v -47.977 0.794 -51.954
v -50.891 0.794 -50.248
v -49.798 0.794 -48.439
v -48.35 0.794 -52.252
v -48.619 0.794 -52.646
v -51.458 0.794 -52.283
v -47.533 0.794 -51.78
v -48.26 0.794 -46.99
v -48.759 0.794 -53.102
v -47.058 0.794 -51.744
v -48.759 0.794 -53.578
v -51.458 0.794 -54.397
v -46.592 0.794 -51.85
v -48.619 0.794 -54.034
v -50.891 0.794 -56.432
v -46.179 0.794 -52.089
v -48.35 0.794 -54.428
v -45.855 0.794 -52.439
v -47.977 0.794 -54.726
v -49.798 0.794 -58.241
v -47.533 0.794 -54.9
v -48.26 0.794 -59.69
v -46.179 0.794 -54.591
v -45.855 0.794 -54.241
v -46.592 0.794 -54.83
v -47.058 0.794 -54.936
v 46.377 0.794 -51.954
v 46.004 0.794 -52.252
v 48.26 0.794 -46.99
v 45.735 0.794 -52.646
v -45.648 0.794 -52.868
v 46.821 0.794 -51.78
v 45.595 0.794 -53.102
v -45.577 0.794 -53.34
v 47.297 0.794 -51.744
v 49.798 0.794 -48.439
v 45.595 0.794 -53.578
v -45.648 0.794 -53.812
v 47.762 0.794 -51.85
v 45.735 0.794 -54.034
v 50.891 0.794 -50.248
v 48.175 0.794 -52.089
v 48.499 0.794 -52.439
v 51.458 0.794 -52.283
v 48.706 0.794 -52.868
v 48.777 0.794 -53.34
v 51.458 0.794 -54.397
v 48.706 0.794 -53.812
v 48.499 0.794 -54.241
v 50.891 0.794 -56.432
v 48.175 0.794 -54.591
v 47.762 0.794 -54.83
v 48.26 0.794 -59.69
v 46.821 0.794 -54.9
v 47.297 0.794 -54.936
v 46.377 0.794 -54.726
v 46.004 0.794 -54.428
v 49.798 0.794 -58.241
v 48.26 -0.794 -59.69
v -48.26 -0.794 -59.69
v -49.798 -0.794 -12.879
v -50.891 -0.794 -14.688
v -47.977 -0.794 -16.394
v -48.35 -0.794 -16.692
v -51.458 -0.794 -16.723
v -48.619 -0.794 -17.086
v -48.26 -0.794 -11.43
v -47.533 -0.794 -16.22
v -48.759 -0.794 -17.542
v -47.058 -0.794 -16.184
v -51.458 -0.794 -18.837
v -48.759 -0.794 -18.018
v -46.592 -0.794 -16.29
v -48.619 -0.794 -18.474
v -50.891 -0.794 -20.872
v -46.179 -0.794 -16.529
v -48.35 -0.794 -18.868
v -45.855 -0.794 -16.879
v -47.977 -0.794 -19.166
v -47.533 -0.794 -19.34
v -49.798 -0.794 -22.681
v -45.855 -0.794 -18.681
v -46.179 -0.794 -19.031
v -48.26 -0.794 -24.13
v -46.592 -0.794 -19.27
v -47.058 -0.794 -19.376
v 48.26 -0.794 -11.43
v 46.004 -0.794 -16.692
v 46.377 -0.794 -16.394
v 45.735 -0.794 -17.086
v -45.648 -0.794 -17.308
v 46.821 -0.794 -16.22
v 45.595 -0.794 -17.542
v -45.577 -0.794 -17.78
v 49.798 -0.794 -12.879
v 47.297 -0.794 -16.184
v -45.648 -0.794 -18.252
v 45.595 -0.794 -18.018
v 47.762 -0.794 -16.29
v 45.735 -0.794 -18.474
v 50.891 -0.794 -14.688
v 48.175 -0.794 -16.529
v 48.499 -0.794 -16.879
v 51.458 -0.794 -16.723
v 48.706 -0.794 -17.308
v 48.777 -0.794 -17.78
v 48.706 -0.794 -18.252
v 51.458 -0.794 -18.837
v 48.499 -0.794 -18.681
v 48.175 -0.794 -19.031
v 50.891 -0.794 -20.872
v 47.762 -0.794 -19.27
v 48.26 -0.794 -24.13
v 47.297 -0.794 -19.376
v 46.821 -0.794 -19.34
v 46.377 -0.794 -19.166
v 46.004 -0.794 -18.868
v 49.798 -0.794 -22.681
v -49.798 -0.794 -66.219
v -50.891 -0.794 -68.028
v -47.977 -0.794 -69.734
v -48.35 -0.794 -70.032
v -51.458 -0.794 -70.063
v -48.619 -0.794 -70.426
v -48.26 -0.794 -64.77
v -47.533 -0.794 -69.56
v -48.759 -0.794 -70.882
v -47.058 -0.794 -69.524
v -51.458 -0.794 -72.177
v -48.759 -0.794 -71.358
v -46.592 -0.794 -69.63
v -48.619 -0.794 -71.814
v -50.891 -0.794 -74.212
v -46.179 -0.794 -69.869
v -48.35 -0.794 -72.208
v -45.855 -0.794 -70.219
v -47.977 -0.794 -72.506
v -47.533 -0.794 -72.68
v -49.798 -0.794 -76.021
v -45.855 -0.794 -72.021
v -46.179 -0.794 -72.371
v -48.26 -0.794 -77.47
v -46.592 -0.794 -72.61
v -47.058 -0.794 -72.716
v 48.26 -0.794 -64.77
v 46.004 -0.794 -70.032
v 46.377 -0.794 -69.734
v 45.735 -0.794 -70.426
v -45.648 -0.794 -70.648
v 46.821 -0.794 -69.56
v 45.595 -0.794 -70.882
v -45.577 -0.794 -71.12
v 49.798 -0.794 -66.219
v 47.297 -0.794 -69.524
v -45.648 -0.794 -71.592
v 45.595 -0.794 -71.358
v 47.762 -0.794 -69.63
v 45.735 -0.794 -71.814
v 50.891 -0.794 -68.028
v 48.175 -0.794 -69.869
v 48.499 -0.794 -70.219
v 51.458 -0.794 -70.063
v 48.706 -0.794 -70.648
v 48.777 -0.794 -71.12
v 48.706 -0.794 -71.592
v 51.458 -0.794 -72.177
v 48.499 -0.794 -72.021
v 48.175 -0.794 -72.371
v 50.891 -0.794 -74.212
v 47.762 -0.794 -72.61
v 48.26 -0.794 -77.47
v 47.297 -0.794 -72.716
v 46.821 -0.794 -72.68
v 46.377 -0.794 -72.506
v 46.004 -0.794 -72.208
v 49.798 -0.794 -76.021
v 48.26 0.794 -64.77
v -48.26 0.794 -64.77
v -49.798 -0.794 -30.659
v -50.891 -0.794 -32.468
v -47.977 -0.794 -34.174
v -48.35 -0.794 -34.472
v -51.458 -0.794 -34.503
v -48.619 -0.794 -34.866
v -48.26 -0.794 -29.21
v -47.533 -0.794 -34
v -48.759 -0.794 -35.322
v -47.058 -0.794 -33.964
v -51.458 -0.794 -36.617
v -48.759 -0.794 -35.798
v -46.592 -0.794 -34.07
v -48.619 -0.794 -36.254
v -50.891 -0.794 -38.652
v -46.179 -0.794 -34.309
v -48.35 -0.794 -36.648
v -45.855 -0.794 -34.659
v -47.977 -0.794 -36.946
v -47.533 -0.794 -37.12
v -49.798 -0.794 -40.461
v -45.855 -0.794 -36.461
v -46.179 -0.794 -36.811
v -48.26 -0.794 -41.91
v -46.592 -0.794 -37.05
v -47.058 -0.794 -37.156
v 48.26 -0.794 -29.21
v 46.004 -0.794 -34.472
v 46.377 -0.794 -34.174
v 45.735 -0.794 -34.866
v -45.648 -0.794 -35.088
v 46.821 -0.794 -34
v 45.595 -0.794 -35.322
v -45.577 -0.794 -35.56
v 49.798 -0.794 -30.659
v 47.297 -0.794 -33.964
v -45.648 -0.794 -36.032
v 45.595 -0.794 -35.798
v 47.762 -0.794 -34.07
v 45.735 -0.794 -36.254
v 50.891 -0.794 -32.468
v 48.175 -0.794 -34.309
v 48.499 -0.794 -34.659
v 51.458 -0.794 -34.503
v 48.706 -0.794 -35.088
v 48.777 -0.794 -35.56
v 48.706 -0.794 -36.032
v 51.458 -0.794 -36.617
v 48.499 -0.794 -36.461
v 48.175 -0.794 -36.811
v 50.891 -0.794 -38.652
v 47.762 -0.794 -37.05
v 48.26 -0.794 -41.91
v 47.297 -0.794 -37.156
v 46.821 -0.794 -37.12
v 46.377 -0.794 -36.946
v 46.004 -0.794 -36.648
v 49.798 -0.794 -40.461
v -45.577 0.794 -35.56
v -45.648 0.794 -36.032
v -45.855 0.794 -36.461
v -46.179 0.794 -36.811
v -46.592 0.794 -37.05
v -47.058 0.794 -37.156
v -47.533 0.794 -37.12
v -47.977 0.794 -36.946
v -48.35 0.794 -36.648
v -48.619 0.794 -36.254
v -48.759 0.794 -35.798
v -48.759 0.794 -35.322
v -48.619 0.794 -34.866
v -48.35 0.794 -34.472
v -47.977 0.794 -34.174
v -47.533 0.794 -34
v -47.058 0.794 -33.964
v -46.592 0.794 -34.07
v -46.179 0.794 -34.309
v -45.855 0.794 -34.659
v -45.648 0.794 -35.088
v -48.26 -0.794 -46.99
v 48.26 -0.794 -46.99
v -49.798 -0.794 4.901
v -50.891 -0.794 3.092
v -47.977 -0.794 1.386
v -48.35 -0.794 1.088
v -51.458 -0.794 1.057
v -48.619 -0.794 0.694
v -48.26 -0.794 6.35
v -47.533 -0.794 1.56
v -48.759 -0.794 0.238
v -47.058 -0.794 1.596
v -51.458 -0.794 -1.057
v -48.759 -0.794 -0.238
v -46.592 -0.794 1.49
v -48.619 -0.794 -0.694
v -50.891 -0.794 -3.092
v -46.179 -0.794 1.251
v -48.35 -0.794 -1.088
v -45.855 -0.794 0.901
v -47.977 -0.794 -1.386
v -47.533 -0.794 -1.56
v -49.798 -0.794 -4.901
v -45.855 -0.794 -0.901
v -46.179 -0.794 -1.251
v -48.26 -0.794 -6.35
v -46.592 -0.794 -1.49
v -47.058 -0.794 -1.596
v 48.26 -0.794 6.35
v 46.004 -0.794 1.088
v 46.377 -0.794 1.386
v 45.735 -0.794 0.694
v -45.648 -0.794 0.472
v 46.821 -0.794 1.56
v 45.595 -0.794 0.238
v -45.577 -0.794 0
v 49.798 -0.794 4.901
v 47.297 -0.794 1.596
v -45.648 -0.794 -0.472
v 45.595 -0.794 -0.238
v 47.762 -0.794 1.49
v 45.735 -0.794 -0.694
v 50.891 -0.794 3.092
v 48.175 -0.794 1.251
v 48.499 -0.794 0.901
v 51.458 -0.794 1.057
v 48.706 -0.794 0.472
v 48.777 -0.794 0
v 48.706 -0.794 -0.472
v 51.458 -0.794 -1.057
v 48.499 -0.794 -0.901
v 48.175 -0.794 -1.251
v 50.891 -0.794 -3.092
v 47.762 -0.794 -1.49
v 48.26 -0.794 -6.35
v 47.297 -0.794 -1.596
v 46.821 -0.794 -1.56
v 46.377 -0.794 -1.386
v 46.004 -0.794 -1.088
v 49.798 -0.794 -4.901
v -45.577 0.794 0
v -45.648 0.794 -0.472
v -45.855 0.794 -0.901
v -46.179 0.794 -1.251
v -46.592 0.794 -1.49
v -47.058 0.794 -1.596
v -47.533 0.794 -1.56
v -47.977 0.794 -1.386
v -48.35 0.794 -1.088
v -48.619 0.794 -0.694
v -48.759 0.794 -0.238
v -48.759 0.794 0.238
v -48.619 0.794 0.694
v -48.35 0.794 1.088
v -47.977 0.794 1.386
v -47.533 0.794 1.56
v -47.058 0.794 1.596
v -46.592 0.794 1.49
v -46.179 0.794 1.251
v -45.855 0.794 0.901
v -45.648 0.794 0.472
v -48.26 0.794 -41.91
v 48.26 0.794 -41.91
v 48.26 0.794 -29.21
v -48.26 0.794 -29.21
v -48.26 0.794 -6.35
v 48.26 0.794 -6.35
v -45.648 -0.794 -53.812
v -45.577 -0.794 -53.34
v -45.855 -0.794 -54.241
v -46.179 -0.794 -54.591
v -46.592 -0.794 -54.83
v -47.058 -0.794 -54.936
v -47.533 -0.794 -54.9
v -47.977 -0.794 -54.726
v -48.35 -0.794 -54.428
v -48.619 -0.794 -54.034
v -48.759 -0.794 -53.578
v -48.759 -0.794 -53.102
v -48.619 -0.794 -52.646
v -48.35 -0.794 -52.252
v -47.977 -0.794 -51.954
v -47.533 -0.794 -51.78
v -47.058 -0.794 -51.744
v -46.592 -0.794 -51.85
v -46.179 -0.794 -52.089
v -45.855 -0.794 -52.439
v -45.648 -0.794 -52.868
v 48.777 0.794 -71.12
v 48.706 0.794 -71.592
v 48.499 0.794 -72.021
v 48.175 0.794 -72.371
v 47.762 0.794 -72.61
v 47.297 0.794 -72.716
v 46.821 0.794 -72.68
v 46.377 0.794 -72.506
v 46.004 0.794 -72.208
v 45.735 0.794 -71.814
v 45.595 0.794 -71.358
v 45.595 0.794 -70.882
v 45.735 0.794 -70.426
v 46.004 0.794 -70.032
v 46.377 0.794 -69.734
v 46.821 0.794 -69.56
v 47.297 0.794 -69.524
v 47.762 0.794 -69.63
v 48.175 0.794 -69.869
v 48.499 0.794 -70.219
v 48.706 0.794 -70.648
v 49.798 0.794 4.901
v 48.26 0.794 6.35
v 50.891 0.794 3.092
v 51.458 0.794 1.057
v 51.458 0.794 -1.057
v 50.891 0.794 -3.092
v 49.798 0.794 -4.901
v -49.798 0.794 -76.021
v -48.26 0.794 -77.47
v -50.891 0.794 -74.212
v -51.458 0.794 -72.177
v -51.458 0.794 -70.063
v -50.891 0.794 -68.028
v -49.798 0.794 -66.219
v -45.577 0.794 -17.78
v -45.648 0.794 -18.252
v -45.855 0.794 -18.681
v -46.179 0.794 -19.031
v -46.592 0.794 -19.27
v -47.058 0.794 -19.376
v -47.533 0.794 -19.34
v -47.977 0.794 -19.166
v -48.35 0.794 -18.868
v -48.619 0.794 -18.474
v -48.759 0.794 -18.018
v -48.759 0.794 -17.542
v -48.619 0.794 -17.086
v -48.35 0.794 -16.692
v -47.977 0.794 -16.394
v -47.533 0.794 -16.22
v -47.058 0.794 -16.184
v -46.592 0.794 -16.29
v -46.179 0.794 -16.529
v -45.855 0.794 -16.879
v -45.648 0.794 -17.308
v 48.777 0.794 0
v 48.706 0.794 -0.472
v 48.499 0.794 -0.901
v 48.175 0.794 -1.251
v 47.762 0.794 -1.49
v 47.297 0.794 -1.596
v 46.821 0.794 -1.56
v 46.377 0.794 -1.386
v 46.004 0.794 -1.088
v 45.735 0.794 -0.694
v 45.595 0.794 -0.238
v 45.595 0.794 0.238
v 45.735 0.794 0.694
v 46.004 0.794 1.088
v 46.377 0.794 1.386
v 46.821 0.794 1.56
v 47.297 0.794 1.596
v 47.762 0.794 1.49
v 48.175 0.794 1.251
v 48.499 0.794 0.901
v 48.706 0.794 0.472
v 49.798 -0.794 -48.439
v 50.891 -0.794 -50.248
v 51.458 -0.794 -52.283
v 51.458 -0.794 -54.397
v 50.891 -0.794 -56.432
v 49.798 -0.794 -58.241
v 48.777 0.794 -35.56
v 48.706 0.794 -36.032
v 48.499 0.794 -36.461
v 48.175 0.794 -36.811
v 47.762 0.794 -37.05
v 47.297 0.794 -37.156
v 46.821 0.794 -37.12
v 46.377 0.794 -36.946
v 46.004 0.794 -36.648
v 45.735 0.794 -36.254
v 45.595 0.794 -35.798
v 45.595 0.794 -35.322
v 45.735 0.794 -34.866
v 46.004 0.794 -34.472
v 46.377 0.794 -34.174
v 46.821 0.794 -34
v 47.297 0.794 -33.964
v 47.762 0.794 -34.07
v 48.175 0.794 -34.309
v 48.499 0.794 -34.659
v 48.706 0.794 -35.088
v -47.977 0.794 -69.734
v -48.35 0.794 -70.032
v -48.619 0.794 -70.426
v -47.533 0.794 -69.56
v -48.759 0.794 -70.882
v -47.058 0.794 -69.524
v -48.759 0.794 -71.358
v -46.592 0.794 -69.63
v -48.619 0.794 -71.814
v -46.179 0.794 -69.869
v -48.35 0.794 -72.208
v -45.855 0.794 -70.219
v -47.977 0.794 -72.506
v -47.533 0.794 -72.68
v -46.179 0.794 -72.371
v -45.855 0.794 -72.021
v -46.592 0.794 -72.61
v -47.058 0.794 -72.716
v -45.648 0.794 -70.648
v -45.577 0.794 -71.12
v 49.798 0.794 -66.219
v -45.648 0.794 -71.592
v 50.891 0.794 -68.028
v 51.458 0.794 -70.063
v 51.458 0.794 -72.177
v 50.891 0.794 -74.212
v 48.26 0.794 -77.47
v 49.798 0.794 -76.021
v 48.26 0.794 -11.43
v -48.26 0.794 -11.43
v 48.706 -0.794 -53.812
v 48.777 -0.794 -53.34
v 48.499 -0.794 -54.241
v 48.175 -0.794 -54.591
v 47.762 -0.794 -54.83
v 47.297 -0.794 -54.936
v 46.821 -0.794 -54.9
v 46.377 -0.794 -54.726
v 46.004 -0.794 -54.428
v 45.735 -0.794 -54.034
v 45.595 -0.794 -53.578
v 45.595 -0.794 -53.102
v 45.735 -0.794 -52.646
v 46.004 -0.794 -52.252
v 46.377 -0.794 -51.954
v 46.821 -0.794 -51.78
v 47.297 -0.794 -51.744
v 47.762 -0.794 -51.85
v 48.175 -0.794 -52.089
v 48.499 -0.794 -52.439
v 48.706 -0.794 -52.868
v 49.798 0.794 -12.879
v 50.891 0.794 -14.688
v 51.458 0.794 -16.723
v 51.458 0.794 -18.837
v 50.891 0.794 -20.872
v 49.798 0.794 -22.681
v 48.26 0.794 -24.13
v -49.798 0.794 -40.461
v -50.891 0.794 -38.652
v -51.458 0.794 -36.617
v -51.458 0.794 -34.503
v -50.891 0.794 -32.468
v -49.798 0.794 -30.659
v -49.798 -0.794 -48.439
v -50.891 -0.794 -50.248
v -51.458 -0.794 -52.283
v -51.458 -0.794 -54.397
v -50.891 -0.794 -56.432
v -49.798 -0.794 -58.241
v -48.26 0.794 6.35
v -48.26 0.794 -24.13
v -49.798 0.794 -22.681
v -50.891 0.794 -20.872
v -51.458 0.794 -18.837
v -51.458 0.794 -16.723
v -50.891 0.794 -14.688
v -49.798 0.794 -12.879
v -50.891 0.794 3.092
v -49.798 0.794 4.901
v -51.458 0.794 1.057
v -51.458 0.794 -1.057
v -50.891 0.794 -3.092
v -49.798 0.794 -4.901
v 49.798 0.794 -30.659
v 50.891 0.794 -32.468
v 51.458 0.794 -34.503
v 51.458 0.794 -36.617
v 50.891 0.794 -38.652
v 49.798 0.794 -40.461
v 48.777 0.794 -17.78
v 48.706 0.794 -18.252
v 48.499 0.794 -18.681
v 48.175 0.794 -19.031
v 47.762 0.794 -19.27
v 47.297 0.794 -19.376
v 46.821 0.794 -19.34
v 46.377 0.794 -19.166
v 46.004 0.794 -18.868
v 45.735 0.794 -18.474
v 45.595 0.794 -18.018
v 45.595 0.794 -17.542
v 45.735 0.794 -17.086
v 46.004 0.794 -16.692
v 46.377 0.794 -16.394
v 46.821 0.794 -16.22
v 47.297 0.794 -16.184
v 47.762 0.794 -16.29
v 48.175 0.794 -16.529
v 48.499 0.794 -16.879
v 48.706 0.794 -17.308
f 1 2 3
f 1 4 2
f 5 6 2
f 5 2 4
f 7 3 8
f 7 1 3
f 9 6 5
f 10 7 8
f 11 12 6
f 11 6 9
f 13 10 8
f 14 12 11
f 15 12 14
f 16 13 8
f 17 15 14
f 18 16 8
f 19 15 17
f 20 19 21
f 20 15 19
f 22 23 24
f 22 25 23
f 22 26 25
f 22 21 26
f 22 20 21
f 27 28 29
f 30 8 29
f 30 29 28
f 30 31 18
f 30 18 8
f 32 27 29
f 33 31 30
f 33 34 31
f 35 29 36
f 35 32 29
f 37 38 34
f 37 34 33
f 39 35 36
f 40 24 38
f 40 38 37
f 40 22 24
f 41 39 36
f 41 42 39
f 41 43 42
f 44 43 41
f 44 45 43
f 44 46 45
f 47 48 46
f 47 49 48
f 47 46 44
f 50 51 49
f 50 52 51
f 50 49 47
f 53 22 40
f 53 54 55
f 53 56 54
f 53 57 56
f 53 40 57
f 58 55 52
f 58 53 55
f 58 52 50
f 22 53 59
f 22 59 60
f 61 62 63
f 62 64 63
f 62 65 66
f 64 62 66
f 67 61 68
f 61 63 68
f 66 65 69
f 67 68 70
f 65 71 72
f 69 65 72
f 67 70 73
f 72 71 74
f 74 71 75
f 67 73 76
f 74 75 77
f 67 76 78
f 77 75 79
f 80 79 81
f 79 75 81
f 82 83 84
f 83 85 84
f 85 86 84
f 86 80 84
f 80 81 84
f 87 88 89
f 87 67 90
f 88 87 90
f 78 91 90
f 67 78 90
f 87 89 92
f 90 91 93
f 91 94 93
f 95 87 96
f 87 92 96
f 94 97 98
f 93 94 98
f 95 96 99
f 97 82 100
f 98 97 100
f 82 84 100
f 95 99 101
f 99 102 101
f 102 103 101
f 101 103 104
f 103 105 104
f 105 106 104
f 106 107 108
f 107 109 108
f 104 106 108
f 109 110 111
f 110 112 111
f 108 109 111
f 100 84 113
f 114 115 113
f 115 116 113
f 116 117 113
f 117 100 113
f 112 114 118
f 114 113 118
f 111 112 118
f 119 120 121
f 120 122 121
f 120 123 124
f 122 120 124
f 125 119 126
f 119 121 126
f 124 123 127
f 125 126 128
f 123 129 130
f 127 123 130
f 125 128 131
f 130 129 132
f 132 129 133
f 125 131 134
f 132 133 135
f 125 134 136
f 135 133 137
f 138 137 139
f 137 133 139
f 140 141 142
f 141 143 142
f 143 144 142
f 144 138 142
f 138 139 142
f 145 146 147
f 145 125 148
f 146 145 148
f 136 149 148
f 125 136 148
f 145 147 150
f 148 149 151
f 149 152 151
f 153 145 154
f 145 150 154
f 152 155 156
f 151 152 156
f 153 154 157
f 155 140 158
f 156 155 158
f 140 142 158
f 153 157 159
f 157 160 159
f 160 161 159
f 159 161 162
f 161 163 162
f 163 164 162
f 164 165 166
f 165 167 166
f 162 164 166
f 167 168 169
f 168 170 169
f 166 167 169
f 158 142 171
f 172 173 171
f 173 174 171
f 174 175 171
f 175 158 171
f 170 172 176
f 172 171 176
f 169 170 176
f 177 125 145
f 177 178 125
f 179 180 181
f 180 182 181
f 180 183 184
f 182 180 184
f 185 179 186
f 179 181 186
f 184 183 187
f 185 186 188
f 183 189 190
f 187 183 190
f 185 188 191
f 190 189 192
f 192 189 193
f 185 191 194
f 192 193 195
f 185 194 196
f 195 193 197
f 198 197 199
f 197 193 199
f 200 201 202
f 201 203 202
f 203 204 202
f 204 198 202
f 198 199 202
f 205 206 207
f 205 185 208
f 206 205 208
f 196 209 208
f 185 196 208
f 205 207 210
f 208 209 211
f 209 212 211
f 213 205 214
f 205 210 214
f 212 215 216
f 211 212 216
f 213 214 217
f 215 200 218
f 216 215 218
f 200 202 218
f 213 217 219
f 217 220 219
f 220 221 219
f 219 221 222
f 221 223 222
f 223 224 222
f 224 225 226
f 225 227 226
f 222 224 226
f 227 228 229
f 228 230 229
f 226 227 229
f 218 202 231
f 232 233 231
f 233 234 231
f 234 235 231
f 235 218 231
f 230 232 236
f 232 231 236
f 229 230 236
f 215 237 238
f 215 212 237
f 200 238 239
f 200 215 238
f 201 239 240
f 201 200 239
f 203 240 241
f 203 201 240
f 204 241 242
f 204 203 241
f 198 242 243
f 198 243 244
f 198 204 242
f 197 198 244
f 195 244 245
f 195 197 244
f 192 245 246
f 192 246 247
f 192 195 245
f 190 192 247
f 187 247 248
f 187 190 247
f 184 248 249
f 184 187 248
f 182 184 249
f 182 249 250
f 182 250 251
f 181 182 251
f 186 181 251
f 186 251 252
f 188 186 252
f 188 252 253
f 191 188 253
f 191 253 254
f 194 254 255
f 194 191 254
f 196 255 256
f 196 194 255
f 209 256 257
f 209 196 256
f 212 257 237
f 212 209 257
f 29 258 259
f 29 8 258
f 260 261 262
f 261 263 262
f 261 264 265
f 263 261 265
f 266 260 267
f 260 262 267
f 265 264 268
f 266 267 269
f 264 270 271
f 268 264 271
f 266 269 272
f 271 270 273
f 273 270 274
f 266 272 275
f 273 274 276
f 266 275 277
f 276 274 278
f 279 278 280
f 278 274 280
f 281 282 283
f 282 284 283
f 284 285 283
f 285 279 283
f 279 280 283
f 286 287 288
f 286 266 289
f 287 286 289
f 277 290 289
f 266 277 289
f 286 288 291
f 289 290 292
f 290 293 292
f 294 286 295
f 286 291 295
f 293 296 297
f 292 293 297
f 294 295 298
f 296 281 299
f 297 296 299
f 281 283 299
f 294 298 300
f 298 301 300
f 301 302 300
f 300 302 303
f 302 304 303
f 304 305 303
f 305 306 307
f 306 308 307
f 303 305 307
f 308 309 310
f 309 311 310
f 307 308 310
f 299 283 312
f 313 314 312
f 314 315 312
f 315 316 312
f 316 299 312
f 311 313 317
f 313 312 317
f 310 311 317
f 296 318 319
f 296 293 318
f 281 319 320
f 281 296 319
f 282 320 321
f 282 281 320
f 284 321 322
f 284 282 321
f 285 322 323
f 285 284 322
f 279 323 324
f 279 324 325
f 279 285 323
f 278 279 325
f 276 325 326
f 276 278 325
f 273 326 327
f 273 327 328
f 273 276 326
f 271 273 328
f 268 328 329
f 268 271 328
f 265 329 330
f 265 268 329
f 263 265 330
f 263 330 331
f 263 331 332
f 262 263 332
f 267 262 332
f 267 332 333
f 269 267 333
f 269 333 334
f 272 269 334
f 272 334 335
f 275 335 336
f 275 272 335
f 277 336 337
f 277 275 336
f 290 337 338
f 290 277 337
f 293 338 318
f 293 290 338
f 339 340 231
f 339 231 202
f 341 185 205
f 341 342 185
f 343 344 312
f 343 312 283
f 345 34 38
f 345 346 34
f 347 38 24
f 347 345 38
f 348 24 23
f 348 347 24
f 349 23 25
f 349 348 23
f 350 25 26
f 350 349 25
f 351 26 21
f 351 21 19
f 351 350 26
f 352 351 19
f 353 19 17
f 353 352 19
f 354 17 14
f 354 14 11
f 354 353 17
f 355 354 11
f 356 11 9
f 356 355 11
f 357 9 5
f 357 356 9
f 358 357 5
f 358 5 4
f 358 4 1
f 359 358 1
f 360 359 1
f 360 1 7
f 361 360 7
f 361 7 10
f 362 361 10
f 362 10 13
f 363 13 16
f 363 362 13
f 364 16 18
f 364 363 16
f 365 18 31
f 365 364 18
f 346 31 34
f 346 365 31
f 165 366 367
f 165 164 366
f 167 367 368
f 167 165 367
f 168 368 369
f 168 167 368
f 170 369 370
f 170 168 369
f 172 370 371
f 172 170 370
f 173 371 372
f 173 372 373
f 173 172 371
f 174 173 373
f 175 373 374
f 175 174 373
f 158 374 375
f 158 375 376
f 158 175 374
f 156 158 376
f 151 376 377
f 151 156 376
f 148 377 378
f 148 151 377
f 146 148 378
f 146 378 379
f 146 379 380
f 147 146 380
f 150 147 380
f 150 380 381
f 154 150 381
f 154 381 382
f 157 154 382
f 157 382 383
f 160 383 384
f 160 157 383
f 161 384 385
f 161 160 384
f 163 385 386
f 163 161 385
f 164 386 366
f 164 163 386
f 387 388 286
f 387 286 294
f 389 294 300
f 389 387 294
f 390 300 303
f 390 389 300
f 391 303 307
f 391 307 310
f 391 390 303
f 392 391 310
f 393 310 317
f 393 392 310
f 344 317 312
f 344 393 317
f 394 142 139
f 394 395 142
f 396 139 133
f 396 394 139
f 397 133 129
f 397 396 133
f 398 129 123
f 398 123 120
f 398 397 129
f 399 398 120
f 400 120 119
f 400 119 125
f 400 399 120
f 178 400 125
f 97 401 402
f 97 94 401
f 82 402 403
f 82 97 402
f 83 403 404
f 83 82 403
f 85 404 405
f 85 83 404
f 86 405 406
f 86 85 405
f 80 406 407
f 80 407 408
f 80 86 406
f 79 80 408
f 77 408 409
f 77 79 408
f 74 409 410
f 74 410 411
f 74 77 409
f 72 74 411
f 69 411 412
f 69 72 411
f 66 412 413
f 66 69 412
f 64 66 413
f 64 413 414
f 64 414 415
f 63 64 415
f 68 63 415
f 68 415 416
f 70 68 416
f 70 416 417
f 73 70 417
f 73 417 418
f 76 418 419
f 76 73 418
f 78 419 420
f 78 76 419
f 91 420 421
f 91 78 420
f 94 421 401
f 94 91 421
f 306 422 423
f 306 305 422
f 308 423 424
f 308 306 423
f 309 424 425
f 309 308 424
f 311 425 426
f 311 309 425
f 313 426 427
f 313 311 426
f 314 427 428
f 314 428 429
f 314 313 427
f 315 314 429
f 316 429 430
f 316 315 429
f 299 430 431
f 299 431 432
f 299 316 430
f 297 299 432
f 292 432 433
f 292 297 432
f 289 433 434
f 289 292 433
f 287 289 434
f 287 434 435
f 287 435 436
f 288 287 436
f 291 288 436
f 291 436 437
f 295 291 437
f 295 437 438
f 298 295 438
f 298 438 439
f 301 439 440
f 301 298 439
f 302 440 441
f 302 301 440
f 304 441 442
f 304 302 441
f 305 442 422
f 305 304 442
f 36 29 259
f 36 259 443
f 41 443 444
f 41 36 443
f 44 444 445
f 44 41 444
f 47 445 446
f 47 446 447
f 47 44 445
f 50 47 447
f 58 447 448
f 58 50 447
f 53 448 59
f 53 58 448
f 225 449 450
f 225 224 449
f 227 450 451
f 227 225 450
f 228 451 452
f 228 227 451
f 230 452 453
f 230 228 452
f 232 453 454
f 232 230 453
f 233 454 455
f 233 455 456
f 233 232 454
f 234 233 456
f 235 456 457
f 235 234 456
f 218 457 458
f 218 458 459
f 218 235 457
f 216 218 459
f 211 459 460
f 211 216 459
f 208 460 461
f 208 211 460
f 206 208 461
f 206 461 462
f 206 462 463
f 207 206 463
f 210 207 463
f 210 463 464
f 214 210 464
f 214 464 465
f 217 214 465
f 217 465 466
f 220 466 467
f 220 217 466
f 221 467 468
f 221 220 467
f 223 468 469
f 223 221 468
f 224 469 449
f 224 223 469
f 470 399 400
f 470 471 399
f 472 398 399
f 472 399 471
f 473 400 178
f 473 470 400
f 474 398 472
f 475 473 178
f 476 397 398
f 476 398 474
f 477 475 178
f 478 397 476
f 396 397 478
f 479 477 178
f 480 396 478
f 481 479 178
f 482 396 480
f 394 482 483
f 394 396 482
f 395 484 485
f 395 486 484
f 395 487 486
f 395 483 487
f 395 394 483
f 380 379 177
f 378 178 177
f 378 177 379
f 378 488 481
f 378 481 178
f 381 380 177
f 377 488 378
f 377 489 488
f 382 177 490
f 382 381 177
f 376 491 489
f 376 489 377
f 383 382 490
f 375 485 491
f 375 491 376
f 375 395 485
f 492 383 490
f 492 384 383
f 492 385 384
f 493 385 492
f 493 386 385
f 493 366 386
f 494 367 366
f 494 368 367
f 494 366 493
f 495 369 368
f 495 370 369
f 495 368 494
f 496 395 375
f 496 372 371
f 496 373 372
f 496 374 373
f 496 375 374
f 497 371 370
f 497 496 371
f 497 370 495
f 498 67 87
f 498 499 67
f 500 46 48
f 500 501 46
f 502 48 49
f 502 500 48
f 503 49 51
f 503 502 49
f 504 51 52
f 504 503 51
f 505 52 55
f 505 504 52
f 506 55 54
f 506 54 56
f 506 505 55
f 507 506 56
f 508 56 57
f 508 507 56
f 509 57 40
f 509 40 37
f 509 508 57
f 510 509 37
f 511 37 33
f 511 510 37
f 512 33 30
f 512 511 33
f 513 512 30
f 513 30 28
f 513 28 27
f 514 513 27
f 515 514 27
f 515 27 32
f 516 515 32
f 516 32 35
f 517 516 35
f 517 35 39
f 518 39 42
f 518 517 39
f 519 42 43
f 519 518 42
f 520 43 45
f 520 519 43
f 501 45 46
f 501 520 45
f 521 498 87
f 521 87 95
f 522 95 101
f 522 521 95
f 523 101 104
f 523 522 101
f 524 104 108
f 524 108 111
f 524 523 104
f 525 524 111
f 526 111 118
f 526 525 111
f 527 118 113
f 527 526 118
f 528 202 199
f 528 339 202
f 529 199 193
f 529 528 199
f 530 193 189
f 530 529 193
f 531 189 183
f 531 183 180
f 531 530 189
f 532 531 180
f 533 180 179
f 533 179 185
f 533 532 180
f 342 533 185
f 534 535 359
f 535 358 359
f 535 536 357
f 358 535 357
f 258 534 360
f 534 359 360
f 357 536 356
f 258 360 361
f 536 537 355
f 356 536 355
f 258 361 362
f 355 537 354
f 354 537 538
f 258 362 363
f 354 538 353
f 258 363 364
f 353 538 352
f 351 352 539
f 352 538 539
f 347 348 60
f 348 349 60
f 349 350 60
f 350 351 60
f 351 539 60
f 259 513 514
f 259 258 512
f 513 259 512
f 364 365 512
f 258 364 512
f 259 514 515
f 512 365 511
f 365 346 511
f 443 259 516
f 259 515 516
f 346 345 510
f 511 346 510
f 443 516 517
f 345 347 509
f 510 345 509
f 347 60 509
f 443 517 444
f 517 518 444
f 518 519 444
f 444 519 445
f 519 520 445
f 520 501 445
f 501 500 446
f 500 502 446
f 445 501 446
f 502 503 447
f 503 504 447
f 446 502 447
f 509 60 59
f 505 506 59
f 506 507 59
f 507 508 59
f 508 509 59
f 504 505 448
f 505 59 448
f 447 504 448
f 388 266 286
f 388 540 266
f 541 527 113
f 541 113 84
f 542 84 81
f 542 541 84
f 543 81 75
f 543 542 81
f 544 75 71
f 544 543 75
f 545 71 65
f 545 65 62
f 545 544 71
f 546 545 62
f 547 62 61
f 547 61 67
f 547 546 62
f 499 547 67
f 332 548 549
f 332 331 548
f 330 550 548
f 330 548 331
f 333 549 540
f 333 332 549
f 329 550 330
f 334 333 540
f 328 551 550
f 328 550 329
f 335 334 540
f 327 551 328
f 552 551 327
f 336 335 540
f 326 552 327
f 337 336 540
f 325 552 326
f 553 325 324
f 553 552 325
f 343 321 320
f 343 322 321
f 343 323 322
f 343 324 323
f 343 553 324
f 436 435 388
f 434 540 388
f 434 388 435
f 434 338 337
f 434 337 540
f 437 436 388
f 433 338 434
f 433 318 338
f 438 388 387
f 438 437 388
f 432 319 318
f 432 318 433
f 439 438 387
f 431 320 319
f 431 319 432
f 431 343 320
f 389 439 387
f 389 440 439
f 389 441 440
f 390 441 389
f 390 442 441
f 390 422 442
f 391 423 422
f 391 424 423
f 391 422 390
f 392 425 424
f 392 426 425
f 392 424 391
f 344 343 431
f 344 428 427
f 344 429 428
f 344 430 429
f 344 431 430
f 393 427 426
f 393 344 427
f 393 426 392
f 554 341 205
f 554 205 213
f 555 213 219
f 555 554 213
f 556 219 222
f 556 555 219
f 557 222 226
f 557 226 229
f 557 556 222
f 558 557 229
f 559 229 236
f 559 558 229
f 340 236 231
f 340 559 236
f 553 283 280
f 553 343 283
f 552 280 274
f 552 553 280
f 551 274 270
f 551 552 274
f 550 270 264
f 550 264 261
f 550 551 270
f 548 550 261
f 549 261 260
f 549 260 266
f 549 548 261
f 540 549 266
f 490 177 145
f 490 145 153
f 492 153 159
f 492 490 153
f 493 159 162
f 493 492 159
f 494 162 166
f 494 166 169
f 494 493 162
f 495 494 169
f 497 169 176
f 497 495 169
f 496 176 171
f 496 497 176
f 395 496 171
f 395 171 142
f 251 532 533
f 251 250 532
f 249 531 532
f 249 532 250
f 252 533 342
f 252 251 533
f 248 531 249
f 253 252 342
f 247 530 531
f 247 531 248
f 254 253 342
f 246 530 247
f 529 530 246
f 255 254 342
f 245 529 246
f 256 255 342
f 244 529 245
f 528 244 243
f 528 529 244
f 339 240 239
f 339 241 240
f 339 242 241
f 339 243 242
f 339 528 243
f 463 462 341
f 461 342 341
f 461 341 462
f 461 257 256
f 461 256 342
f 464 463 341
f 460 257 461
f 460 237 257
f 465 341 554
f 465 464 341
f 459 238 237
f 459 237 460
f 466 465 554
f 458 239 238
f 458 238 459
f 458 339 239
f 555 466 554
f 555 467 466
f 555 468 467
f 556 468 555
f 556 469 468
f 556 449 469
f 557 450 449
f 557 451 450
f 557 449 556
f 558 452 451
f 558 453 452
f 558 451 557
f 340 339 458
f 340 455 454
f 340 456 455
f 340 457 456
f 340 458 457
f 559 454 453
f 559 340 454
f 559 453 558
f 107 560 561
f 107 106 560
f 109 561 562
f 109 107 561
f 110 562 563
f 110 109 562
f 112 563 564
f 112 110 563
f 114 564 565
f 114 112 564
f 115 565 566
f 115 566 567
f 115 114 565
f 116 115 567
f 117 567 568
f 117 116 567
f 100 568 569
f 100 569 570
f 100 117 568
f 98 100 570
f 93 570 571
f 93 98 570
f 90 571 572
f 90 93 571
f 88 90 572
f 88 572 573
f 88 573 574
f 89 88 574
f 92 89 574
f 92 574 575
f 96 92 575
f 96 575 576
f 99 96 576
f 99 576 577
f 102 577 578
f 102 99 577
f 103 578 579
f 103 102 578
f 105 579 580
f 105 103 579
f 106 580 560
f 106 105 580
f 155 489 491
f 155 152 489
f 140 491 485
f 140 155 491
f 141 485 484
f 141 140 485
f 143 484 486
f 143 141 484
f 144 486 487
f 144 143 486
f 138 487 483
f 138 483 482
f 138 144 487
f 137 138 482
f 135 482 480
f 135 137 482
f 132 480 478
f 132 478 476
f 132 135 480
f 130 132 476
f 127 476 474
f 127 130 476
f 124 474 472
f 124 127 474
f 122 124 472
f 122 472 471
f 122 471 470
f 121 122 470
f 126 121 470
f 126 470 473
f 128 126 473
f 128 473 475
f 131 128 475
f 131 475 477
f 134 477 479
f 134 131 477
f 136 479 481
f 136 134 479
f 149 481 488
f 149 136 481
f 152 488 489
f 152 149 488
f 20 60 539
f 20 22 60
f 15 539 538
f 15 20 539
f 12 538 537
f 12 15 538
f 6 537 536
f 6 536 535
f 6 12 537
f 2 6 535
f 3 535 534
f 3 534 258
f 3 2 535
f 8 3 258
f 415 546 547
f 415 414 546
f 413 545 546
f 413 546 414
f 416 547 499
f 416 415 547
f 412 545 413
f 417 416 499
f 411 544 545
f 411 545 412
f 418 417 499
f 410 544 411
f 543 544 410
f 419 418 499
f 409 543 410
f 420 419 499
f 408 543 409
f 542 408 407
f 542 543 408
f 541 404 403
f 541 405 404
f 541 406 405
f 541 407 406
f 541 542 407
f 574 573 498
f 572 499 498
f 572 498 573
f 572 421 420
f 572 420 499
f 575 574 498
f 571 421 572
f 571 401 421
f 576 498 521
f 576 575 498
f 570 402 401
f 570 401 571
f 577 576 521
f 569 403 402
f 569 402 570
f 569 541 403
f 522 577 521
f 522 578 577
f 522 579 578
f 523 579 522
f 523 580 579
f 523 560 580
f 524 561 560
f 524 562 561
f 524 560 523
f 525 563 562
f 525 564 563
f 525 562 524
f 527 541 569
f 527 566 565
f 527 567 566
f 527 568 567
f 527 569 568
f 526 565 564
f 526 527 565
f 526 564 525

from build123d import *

# Parameters (mm, degrees)
SKETCH1_R           = 1.6002
BOSS_EXTRUDE1_DEPTH = 0.79375
LPATTERN1_COUNT     = 5
LPATTERN1_PITCH     = 17.78


with BuildPart() as part:
    # Sketch1 → Boss-Extrude1 (new body, symmetric)
    with BuildSketch(Plane(origin=(0, 0, 0), x_dir=(1, 0, 0), z_dir=(0, 1, 0))):
        with BuildLine():
            Line((-48.26, -6.35), (48.26, -6.35))
            ThreePointArc((48.26, -6.35), (51.530005533, 0), (48.26, 6.35))
            Line((48.26, 6.35), (-48.26, 6.35))
            ThreePointArc((-48.26, 6.35), (-51.530005511, 0), (-48.26, -6.35))
        make_face()
        with Locations((-47.177105686, 0)):
            Circle(SKETCH1_R, mode=Mode.SUBTRACT)
        with Locations((47.177105686, 0)):
            Circle(SKETCH1_R, mode=Mode.SUBTRACT)
    extrude(amount=BOSS_EXTRUDE1_DEPTH, both=True)


with BuildPart() as lpattern1_1:
    # LPattern1: pattern copy
    add(part.part.moved(Location(Vector(0, 0, -1) * (1 * LPATTERN1_PITCH))))


with BuildPart() as lpattern1_2:
    # LPattern1: pattern copy
    add(part.part.moved(Location(Vector(0, 0, -1) * (2 * LPATTERN1_PITCH))))


with BuildPart() as lpattern1_3:
    # LPattern1: pattern copy
    add(part.part.moved(Location(Vector(0, 0, -1) * (3 * LPATTERN1_PITCH))))


with BuildPart() as lpattern1_4:
    # LPattern1: pattern copy
    add(part.part.moved(Location(Vector(0, 0, -1) * (4 * LPATTERN1_PITCH))))


solid = Compound([part.part, lpattern1_1.part, lpattern1_2.part, lpattern1_3.part, lpattern1_4.part])
